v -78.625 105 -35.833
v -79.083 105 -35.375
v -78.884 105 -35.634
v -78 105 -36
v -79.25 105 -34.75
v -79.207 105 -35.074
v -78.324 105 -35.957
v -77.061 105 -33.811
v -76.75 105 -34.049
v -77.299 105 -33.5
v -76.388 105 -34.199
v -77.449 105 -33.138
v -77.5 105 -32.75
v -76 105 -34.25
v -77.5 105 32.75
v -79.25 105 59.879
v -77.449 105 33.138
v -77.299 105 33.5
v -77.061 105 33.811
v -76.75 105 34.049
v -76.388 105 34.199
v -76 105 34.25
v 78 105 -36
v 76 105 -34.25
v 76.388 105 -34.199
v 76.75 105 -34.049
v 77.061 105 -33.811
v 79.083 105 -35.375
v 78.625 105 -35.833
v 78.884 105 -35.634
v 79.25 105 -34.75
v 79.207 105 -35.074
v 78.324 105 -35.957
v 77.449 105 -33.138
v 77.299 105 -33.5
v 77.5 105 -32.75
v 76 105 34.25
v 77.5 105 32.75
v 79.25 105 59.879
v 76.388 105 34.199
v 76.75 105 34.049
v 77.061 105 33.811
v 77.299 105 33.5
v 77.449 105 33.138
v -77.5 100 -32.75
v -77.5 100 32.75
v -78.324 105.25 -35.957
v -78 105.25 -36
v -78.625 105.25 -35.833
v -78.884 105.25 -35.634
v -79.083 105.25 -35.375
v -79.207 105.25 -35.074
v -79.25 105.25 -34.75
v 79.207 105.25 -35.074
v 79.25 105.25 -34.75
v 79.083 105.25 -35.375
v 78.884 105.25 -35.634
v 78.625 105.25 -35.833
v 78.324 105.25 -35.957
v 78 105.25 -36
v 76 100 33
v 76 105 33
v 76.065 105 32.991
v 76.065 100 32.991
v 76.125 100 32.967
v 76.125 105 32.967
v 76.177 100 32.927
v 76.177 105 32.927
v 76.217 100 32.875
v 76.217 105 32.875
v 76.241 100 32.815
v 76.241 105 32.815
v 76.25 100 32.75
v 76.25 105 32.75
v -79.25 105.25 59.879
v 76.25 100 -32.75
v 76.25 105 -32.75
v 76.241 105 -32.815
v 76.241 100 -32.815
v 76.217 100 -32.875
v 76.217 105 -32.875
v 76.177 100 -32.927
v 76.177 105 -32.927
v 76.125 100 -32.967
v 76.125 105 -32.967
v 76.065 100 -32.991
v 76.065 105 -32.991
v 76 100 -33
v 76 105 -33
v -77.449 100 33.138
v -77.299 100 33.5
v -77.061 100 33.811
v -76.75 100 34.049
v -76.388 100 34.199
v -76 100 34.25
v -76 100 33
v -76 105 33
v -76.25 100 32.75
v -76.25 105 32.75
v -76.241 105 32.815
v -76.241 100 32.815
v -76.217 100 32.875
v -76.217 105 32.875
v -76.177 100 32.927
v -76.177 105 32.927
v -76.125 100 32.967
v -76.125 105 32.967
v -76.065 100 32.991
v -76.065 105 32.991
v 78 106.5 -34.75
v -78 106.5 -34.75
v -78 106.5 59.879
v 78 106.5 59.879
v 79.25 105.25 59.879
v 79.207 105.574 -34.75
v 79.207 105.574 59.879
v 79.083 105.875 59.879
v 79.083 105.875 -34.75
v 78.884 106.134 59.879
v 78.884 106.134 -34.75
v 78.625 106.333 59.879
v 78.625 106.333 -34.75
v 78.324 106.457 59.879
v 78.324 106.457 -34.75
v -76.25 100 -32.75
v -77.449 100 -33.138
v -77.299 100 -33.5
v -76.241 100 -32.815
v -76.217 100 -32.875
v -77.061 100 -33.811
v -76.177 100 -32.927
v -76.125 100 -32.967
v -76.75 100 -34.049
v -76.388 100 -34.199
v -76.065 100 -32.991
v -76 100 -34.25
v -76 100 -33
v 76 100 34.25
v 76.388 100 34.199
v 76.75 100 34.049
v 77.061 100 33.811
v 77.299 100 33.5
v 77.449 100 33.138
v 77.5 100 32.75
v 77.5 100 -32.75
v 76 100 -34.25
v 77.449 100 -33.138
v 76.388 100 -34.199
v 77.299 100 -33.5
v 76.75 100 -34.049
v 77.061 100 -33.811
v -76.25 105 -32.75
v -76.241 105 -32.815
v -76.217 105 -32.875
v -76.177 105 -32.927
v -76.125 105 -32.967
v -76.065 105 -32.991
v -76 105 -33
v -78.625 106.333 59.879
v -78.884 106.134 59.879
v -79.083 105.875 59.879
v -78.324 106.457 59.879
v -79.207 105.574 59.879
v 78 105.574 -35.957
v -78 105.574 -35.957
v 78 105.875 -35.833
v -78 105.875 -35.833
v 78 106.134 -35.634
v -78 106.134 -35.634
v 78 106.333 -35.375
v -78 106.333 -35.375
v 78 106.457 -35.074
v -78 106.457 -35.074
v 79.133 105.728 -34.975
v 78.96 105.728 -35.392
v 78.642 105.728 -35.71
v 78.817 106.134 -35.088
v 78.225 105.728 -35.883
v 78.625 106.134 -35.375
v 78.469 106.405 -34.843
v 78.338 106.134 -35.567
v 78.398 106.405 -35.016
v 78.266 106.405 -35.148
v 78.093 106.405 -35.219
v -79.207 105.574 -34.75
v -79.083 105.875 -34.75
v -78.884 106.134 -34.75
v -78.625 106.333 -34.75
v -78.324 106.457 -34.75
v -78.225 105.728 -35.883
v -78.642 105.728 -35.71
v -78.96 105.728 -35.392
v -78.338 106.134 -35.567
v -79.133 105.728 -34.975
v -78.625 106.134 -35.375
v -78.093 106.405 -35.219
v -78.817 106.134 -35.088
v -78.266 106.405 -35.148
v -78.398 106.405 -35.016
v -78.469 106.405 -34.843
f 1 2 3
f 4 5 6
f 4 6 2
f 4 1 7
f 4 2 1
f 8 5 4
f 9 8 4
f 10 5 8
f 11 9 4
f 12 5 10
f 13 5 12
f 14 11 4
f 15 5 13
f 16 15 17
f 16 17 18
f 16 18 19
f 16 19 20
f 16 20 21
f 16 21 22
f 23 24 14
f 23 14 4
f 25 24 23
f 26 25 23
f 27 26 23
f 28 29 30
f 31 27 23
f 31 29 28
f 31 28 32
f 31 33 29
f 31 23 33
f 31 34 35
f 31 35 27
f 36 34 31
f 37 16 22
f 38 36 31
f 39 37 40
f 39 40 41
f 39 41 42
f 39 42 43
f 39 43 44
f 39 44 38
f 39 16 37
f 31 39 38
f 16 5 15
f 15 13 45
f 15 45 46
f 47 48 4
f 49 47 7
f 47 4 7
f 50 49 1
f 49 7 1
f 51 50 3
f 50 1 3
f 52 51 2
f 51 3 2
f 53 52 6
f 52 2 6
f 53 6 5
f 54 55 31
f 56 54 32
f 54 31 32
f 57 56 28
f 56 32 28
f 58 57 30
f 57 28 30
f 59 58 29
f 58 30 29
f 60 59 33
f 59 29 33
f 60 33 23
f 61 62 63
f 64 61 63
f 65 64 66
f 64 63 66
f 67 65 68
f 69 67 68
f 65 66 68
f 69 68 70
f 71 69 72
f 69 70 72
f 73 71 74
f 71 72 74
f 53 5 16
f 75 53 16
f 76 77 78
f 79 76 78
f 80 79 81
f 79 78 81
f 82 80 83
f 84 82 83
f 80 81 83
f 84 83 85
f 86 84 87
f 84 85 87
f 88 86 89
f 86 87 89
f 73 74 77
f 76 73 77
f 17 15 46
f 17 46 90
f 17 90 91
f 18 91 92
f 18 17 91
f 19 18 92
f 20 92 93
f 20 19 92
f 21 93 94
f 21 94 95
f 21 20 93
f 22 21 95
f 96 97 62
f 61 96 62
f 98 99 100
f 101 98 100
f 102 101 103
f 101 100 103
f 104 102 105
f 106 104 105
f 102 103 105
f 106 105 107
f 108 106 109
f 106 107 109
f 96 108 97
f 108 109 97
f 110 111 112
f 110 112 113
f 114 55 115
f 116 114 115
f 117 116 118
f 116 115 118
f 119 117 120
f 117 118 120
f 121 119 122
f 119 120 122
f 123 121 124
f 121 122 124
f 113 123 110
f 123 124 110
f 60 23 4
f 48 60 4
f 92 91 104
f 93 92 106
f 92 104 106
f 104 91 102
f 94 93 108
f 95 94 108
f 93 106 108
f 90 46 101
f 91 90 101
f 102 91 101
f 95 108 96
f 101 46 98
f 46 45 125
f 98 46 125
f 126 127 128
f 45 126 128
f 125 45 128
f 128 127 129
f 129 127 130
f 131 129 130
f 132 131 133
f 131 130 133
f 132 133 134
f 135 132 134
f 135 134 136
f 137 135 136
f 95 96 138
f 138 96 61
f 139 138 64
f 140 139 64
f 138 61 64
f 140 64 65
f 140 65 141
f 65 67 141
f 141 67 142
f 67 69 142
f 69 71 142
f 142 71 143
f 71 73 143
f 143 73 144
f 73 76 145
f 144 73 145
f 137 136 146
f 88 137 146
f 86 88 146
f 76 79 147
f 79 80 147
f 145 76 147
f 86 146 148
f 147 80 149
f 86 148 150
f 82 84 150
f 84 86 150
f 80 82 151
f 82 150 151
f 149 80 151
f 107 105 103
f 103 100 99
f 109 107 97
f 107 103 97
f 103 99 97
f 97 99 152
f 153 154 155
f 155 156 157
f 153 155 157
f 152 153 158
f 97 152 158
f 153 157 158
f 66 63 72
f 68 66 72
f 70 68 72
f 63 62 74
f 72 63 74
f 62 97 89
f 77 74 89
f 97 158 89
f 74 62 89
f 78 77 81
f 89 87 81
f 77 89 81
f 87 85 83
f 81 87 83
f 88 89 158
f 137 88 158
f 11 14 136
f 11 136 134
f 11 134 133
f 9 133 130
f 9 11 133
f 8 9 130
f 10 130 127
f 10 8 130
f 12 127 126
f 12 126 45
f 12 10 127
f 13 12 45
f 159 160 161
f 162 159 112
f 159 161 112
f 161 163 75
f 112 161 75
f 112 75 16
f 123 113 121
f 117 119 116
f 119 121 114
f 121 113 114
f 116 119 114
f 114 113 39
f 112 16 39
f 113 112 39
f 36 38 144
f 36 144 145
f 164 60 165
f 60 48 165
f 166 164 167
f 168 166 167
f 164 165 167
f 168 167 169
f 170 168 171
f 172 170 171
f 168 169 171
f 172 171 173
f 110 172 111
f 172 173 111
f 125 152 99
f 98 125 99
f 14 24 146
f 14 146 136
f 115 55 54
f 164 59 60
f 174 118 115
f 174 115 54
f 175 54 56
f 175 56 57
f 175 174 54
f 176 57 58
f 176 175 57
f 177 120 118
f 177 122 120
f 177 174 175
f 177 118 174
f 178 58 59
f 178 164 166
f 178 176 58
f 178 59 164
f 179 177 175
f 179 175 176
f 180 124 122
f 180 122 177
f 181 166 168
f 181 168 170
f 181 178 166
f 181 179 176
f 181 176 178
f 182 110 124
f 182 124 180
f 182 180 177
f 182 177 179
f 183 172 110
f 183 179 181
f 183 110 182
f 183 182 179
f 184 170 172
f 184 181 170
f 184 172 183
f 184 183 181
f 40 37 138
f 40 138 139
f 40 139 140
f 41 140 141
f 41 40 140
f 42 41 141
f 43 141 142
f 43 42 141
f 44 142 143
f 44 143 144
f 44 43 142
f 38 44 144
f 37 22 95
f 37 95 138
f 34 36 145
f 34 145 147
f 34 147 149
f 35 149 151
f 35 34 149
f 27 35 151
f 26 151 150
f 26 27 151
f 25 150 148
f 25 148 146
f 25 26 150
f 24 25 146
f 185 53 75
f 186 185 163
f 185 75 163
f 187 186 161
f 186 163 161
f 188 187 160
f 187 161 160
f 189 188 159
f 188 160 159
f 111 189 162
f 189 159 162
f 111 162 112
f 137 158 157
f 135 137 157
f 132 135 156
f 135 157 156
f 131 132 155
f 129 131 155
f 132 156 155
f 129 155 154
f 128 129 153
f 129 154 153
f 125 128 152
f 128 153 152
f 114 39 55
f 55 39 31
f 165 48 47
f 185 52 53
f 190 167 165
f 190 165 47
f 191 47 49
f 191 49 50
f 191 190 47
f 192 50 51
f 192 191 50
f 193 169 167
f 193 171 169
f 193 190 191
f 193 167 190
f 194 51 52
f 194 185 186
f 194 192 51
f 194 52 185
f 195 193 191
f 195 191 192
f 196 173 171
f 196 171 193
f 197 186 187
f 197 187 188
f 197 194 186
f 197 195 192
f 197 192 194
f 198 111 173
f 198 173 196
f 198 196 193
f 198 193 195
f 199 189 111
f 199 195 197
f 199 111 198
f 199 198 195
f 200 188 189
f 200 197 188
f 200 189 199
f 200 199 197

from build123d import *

# Parameters (mm, degrees)
BOSS_EXTRUDE1_DEPTH      = 1.25
SKETCH1_W                = 156
SKETCH1_H                = 69.5
BOSS_EXTRUDE2_DEPTH      = 105
SKETCH4_R                = 2.5000000000000027
BOSS_EXTRUDE3_DEPTH      = 8
FILLET2_R                = 2
SKETCH5_R                = 1.5499999999999998
SKETCH5_R_2              = 1.5500000000000012
CUT_EXTRUDE1_DEPTH       = 8
SKETCH6_R                = 8.25
CUT_EXTRUDE2_DEPTH       = 8
SKETCH8_R                = 3.750000000000007
SKETCH8_R_2              = 3.0000000000000084
SKETCH8_W                = 7.000000000000014
SKETCH8_H                = 14
CUT_EXTRUDE3_DEPTH       = 8
FILLET3_R                = 1.25
FILLET4_R                = 1.25
SKETCH11_R               = 1.5499999999999932
CUT_EXTRUDE4_DEPTH       = 8
BOSS_EXTRUDE5_REACH      = 209.004
FILLET5_R                = 1.25
SKETCH14_R               = 1.5249999999999995
CUT_EXTRUDE5_DEPTH       = 8
BOSS_EXTRUDE6_DEPTH      = 5
CUT_EXTRUDE10_DEPTH      = 176.50000000000017
CUT_EXTRUDE10_DEPTH_BACK = 9
SKETCH19_R               = 1.5249999999999995
BOSS_EXTRUDE7_DEPTH      = 1.5
SKETCH17_W               = 214.39373035957487
SKETCH17_H               = 311.75060194691184
CUT_EXTRUDE6_DEPTH       = 142.50000000000003
SKETCH18_W               = 843.8612520819788
SKETCH18_H               = 210.19069540658822
CUT_EXTRUDE7_DEPTH       = 211.50000000000009
FILLET6_R                = 1.25
SKETCH21_R               = 1.5249999999999995
CUT_EXTRUDE11_DEPTH      = 46.50000000000004
SKETCH22_R               = 1.5249999999999952
SKETCH22_R_2             = 0.49999999999999917
SKETCH22_R_3             = 0.9999999999999983
CUT_EXTRUDE12_DEPTH      = 46.50000000000004
SKETCH23_W               = 224.34927592813784
SKETCH23_H               = 20
CUT_EXTRUDE13_DEPTH      = 108.00000000000004
SKETCH24_W               = 223.8278832276348
SKETCH24_H               = 83.20006380200533
CUT_EXTRUDE14_DEPTH      = 108.00000000000004


with BuildPart() as part:
    # Sketch2 → Boss-Extrude1 (new body)
    with BuildSketch(Plane(origin=(0, 0, 0), x_dir=(1, 0, 0), z_dir=(0, 1, 0))):
        Polygon((-79.25000000000004, 35.99999999999998), (79.24999999999996, 35.99999999999999), (79.24999999999999, -159.00000000000003), (-79.25000000000001, -159.00000000000003), align=None)
    extrude(amount=-BOSS_EXTRUDE1_DEPTH)

    # Sketch1 → Boss-Extrude2 (add)
    with BuildSketch(Plane(origin=(0, 0, 0), x_dir=(1, 0, 0), z_dir=(0, 1, 0))):
        Polygon((79.24999999999999, -159.00000000000003), (-79.25000000000001, -159.00000000000003), (-79.25000000000004, -86.00000000000001), (-79.25000000000004, -36.00000000000002), (-79.25000000000004, 35.99999999999998), (79.24999999999996, 35.99999999999999), (79.24999999999996, -36.00000000000002), (79.24999999999996, -86.00000000000001), align=None)
        Polygon((-78.00000000000001, -157.75000000000006), (77.99999999999999, -157.75000000000006), (77.99999999999996, -86.00000000000001), (77.99999999999996, -36.00000000000002), (-78.00000000000004, -36.00000000000002), (-78.00000000000004, -86.00000000000001), (-78.00000000000004, -100.58859756900745), align=None, mode=Mode.SUBTRACT)
        Rectangle(SKETCH1_W, SKETCH1_H, mode=Mode.SUBTRACT)
    extrude(amount=BOSS_EXTRUDE2_DEPTH)

    # Sketch4 → Boss-Extrude3 (add)
    with BuildSketch(Plane(origin=(0, 0, 0), x_dir=(1, 0, 0), z_dir=(0, 1, 0))):
        with Locations(Location((-37.074999999999996, -117.75000000000004, 0), (0, 0, 90))):
            Circle(SKETCH4_R)
        with Locations(Location((37.074999999999996, -117.75000000000003, 0), (0, 0, 90))):
            Circle(SKETCH4_R)
    extrude(amount=BOSS_EXTRUDE3_DEPTH)

    # Fillet2
    fillet2_edges = [part.edges().sort_by_distance(p)[0] for p in [
        (77.99999999999996, 52.5, -34.749999999999986),
        (77.99999999999996, 52.5, 34.750000000000014),
        (-78.00000000000004, 0, 1.421e-14),
        (-78.00000000000004, 52.5, 34.750000000000014),
        (77.99999999999999, 52.5, 157.75000000000006),
        (-78.00000000000001, 52.5, 157.75000000000006),
        (-4.263e-14, 0, 36.00000000000002),
        (-78.00000000000004, 52.5, 36.00000000000002),
        (77.99999999999997, 0, 96.87500000000003),
        (77.99999999999996, 52.5, 36.00000000000002),
        (-4.263e-14, 0, -34.749999999999986),
        (-78.00000000000004, 52.5, -34.749999999999986),
        (-1.421e-14, 0, 157.75000000000006),
        (-78.00000000000003, 0, 96.87500000000004),
        (77.99999999999996, 0, 1.421e-14),
        (-4.263e-14, 0, 34.750000000000014),
        (-37.074999999999996, 0, 120.25000000000004),
        (37.074999999999996, 0, 120.25000000000003),
    ]]
    fillet(fillet2_edges, radius=FILLET2_R)

    # Sketch5 → Cut-Extrude1 (cut)
    with BuildSketch(Plane.XY.offset(36.00000000000002)):
        with BuildLine():
            ThreePointArc((-53.750000000000085, 99.54999999999998), (-54.84601551083924, 99.09601551083914), (-55.30000000000008, 97.99999999999999))
            Line((-55.30000000000008, 97.99999999999999), (-53.750000000000085, 97.99999999999999))
            Line((-53.750000000000085, 97.99999999999999), (-53.750000000000085, 99.54999999999998))
        make_face()
        with BuildLine():
            Line((-53.750000000000085, 97.99999999999999), (-55.30000000000008, 97.99999999999999))
            ThreePointArc((-55.30000000000008, 97.99999999999999), (-53.750000000000085, 96.44999999999999), (-52.20000000000009, 97.99999999999999))
            ThreePointArc((-52.20000000000009, 97.99999999999999), (-52.65398448916093, 99.09601551083914), (-53.750000000000085, 99.54999999999998))
            Line((-53.750000000000085, 99.54999999999998), (-53.750000000000085, 97.99999999999999))
        make_face()
        with Locations((53.750000000000206, 97.99999999999967)):
            Circle(SKETCH5_R)
        with Locations((-53.750000000000085, 7.999999999999743)):
            Circle(SKETCH5_R_2)
        with Locations((53.749999999999666, 7.9999999999994245)):
            Circle(SKETCH5_R_2)
    extrude(amount=-CUT_EXTRUDE1_DEPTH, mode=Mode.SUBTRACT)

    # Sketch6 → Cut-Extrude2 (cut)
    with BuildSketch(Plane(origin=(0, 0, 157.75000000000006), x_dir=(-1, 0, 0), z_dir=(0, 0, -1))):
        with Locations((0, 22)):
            Circle(SKETCH6_R)
    extrude(amount=-CUT_EXTRUDE2_DEPTH, mode=Mode.SUBTRACT)

    # Sketch8 → Cut-Extrude3 (cut)
    with BuildSketch(Plane.ZY.offset(79.25000000000004)):
        with Locations((131.5, 54.99999999999998)):
            Circle(SKETCH8_R)
        with Locations((101.50000000000001, 54.99999999999998)):
            Circle(SKETCH8_R_2)
        with Locations((116.50000000000003, 64.99999999999999)):
            Rectangle(SKETCH8_W, SKETCH8_H)
        with Locations((101.50000000000001, 64.99999999999997)):
            Circle(SKETCH8_R_2)
        with Locations((101.50000000000001, 74.99999999999997)):
            Circle(SKETCH8_R_2)
        with Locations((101.50000000000001, 84.99999999999997)):
            Circle(SKETCH8_R_2)
        with Locations((131.5, 74.99999999999999)):
            Circle(SKETCH8_R)
    extrude(amount=-CUT_EXTRUDE3_DEPTH, mode=Mode.SUBTRACT)

    # Fillet3
    fillet3_edges = [part.edges().sort_by_distance(p)[0] for p in [
        (79.24999999999997, -1.25, 61.50000000000002),
        (-4.263e-14, -1.25, -35.999999999999986),
        (-79.25000000000003, -1.25, 61.50000000000003),
        (-1.421e-14, -1.25, 159.00000000000003),
    ]]
    fillet(fillet3_edges, radius=FILLET3_R)

    # Fillet4
    # the kernel refuses this fillet: 1.25 mm, written as the material it takes off along each edge
    with BuildSketch(Plane(origin=(-78.00000000000004, 0, -34.74999999999997), x_dir=(-9e-17, 0, -1), z_dir=(-1, 0, 1.5e-16))) as fillet4_piece_1_section:
        Polygon((0, 0), (FILLET4_R, 0), (FILLET4_R, FILLET4_R), (0, FILLET4_R), align=None)
    fillet4_piece_1 = extrude(amount=FILLET4_R, mode=Mode.PRIVATE)
    fillet4_piece_1 = fillet4_piece_1 - Plane(origin=(-78.00000000000004, 0, -34.74999999999997), x_dir=(0, 0.7071067811865475, 0.7071067811865475), z_dir=(-1, 0, 1.5e-16)) * Sphere(FILLET4_R, mode=Mode.PRIVATE)
    add(fillet4_piece_1, mode=Mode.SUBTRACT)
    with BuildSketch(Plane(origin=(77.99999999999996, 0, -34.74999999999999), x_dir=(-9e-17, 0, -1), z_dir=(1, 0, -1.5e-16))) as fillet4_piece_2_section:
        Polygon((0, 0), (FILLET4_R, 0), (FILLET4_R, -FILLET4_R), (0, -FILLET4_R), align=None)
    fillet4_piece_2 = extrude(amount=FILLET4_R, mode=Mode.PRIVATE)
    fillet4_piece_2 = fillet4_piece_2 - Plane(origin=(77.99999999999996, 0, -34.74999999999999), x_dir=(0, 0.7071067811865475, 0.7071067811865475), z_dir=(1, 0, -1.5e-16)) * Sphere(FILLET4_R, mode=Mode.PRIVATE)
    add(fillet4_piece_2, mode=Mode.SUBTRACT)
    with BuildSketch(Plane(origin=(-78.00000000000001, 0, 157.75000000000003), x_dir=(-1, 0, 1.5e-16), z_dir=(0, 0, 1))) as fillet4_piece_3_section:
        Polygon((0, 0), (FILLET4_R, 0), (FILLET4_R, FILLET4_R), (0, FILLET4_R), align=None)
    fillet4_piece_3 = extrude(amount=FILLET4_R, mode=Mode.PRIVATE)
    fillet4_piece_3 = fillet4_piece_3 - Plane(origin=(-78.00000000000001, 0, 157.75000000000003), x_dir=(0.7071067811865475, 0.7071067811865475, 0), z_dir=(0, 0, 1)) * Sphere(FILLET4_R, mode=Mode.PRIVATE)
    add(fillet4_piece_3, mode=Mode.SUBTRACT)
    with BuildSketch(Plane(origin=(77.99999999999999, 0, 157.75000000000003), x_dir=(1, 0, -1.5e-16), z_dir=(0, 0, 1))) as fillet4_piece_4_section:
        Polygon((0, 0), (FILLET4_R, 0), (FILLET4_R, -FILLET4_R), (0, -FILLET4_R), align=None)
    fillet4_piece_4 = extrude(amount=FILLET4_R, mode=Mode.PRIVATE)
    fillet4_piece_4 = fillet4_piece_4 - Plane(origin=(77.99999999999999, 0, 157.75000000000003), x_dir=(-0.7071067811865475, 0.7071067811865475, 0), z_dir=(0, 0, 1)) * Sphere(FILLET4_R, mode=Mode.PRIVATE)
    add(fillet4_piece_4, mode=Mode.SUBTRACT)
    with BuildSketch(Plane(origin=(79.24999999999999, 108.12500000000007, 159.00000000000003), x_dir=(-1, 0, 0), z_dir=(0, -1, 0))) as fillet4_piece_5:
        with BuildLine():
            CenterArc((FILLET4_R, FILLET4_R), FILLET4_R, 179.9999999999987, 90.00000000000131)
            Line((0, FILLET4_R), (0, 0))
            Line((0, 0), (FILLET4_R, 0))
        make_face()
    extrude(amount=108.12500000000007, mode=Mode.SUBTRACT)
    with BuildSketch(Plane(origin=(-79.25000000000001, -2.2e-16, 159.00000000000003), x_dir=(1, 0, 0), z_dir=(0, 1, 0))) as fillet4_piece_6:
        with BuildLine():
            CenterArc((FILLET4_R, FILLET4_R), FILLET4_R, 180, 90)
            Line((0, FILLET4_R), (0, 0))
            Line((0, 0), (FILLET4_R, 0))
        make_face()
    extrude(amount=108.12499999999999, mode=Mode.SUBTRACT)
    with BuildSketch(Plane(origin=(79.24999999999996, 108.125, -35.99999999999999), x_dir=(0, 0, 1), z_dir=(0, -1, 0))) as fillet4_piece_7:
        with BuildLine():
            CenterArc((FILLET4_R, FILLET4_R), FILLET4_R, 180, 90)
            Line((0, FILLET4_R), (0, 0))
            Line((0, 0), (FILLET4_R, 0))
        make_face()
    extrude(amount=108.125, mode=Mode.SUBTRACT)
    with BuildSketch(Plane(origin=(-79.25000000000004, -2.2e-16, -35.99999999999998), x_dir=(0, 0, 1), z_dir=(0, 1, 0))) as fillet4_piece_8:
        with BuildLine():
            CenterArc((FILLET4_R, FILLET4_R), FILLET4_R, 180, 90)
            Line((-2.132e-14, FILLET4_R), (0, 0))
            Line((0, 0), (FILLET4_R, 0))
        make_face()
    extrude(amount=108.12499999999999, mode=Mode.SUBTRACT)

    # Sketch11 → Cut-Extrude4 (cut)
    with BuildSketch(Plane(origin=(79.24999999999996, 0, -1.128e-14), x_dir=(-1.4e-16, 0, -1), z_dir=(1, 0, -1.4e-16))):
        with BuildLine():
            ThreePointArc((-13.05000000000001, 102.49999999999999), (-12.596015510839159, 101.40398448916083), (-11.50000000000001, 100.94999999999999))
            Line((-11.50000000000001, 100.94999999999999), (-11.50000000000001, 102.49999999999999))
            Line((-11.500000000000014, 102.49999999999999), (-13.050000000000011, 102.49999999999999))
        make_face()
        with BuildLine():
            Line((-11.50000000000001, 102.49999999999999), (-11.50000000000001, 100.94999999999999))
            ThreePointArc((-11.50000000000001, 100.94999999999999), (-10.403984489160864, 101.40398448916083), (-9.950000000000012, 102.49999999999999))
            ThreePointArc((-9.950000000000012, 102.49999999999999), (-11.50000000000001, 104.04999999999998), (-13.05000000000001, 102.49999999999999))
            Line((-13.050000000000011, 102.49999999999999), (-11.500000000000014, 102.49999999999999))
        make_face()
        with BuildLine():
            ThreePointArc((-25.550000000000008, 90), (-25.096015510839155, 88.90398448916085), (-24.000000000000007, 88.45))
            Line((-24.000000000000007, 88.45000000000002), (-24.000000000000007, 90))
            Line((-24, 90), (-25.55000000000001, 90))
        make_face()
        with BuildLine():
            Line((-24.000000000000007, 90), (-24.000000000000007, 88.45000000000002))
            ThreePointArc((-24.000000000000007, 88.45), (-22.90398448916086, 88.90398448916085), (-22.450000000000006, 90))
            ThreePointArc((-22.450000000000006, 90), (-24.000000000000007, 91.55), (-25.550000000000008, 90))
            Line((-25.55000000000001, 90), (-24, 90))
        make_face()
        with BuildLine():
            ThreePointArc((-9.949999999999998, 2.4999999999999742), (-10.403984489160848, 3.5960155108391216), (-11.499999999999995, 4.049999999999974))
            Line((-11.499999999999996, 4.049999999999969), (-11.499999999999996, 2.4999999999999716))
            Line((-11.5, 2.4999999999999742), (-13.049999999999997, 2.4999999999999742))
            ThreePointArc((-13.049999999999995, 2.4999999999999742), (-11.499999999999996, 0.9499999999999749), (-9.949999999999998, 2.499999999999974))
        make_face()
        with BuildLine():
            Line((-11.499999999999996, 2.4999999999999716), (-11.499999999999996, 4.049999999999969))
            ThreePointArc((-11.499999999999995, 4.049999999999974), (-12.596015510839145, 3.596015510839123), (-13.049999999999995, 2.4999999999999742))
            Line((-13.049999999999997, 2.4999999999999742), (-11.5, 2.4999999999999742))
        make_face()
        with BuildLine():
            ThreePointArc((-111.5, 4.049999999999969), (-112.59601551083915, 1.40398448916083), (-109.95, 2.499999999999974))
            Line((-109.95, 2.4999999999999742), (-111.5, 2.4999999999999742))
            Line((-111.5, 2.4999999999999716), (-111.5, 4.049999999999969))
        make_face()
        with BuildLine():
            Line((-111.5, 2.4999999999999742), (-109.95, 2.4999999999999742))
            ThreePointArc((-109.95, 2.4999999999999742), (-110.40398448916086, 3.5960155108391185), (-111.5, 4.049999999999969))
            Line((-111.5, 4.049999999999969), (-111.5, 2.4999999999999716))
        make_face()
        with BuildLine():
            ThreePointArc((-97.45, 14.999999999999993), (-97.90398448916086, 16.096015510839138), (-99, 16.549999999999986))
            Line((-99, 16.549999999999986), (-99, 14.999999999999993))
            Line((-99, 14.999999999999993), (-97.45, 14.999999999999993))
        make_face()
        with BuildLine():
            Line((-99, 14.999999999999993), (-99, 16.549999999999986))
            ThreePointArc((-99, 16.549999999999986), (-100.09601551083915, 13.903984489160848), (-97.45, 14.999999999999993))
            Line((-97.45, 14.999999999999993), (-99, 14.999999999999993))
        make_face()
        with BuildLine():
            ThreePointArc((-22.450000000000006, 14.999999999999993), (-22.90398448916086, 16.09601551083914), (-24.000000000000007, 16.549999999999994))
            Line((-24.000000000000007, 16.549999999999994), (-24.000000000000007, 14.999999999999993))
            Line((-24, 14.999999999999993), (-25.55000000000001, 14.999999999999993))
            ThreePointArc((-25.550000000000008, 14.999999999999993), (-24.000000000000007, 13.449999999999992), (-22.450000000000006, 14.999999999999993))
        make_face()
        with BuildLine():
            Line((-24.000000000000007, 14.999999999999993), (-24.000000000000007, 16.549999999999994))
            ThreePointArc((-24.000000000000007, 16.549999999999994), (-25.096015510839155, 16.09601551083914), (-25.550000000000008, 14.999999999999993))
            Line((-25.55000000000001, 14.999999999999993), (-24, 14.999999999999993))
        make_face()
        with Locations((-111.50000000000001, 102.49999999999999)):
            Circle(SKETCH11_R)
        with Locations((-99, 90)):
            Circle(SKETCH11_R)
    extrude(amount=-CUT_EXTRUDE4_DEPTH, mode=Mode.SUBTRACT)

    # Boss-Extrude5: up to this face of the body (flat: up to its plane)
    boss_extrude5_end = Plane(part.part.faces().sort_by_distance((0, 0, 96.725539908))[0])
    # Sketch12 → Boss-Extrude5 (add, up to the picked face)
    with BuildSketch(Plane(origin=(0, 105, 0), x_dir=(1, 0, 0), z_dir=(0, 1, 0)), mode=Mode.PRIVATE) as boss_extrude5_sk1:
        with BuildLine():
            Line((73, -152.75000000000043), (72.99999999999997, -157.75000000000043))
            Line((72.99999999999997, -157.75000000000043), (75.99999999999996, -157.75000000000045))
            ThreePointArc((75.99999999999996, -157.75000000000006), (77.41421356237305, -157.16421356237316), (77.99999999999994, -155.75000000000006))
            Line((77.99999999999999, -155.75000000000006), (78, -152.75000000000045))
            Line((78, -152.75000000000045), (73, -152.75000000000043))
        make_face()
    boss_extrude5_tool1 = split(extrude(boss_extrude5_sk1.sketch, amount=-BOSS_EXTRUDE5_REACH, mode=Mode.PRIVATE), bisect_by=boss_extrude5_end, keep=Keep.BOTH, mode=Mode.PRIVATE)
    # Sketch12 → Boss-Extrude5 (add, up to the picked face)
    with BuildSketch(Plane(origin=(0, 105, 0), x_dir=(1, 0, 0), z_dir=(0, 1, 0)), mode=Mode.PRIVATE) as boss_extrude5_sk2:
        with BuildLine():
            ThreePointArc((-78.00000000000003, -155.75000000000006), (-77.41421356237313, -157.16421356237316), (-76.00000000000003, -157.75000000000006))
            Line((-76.00000000000003, -157.75000000000006), (-73.00000000000003, -157.75000000000006))
            Line((-73.00000000000003, -157.75000000000006), (-73.00000000000003, -152.75000000000006))
            Line((-73.00000000000003, -152.75000000000006), (-78.00000000000003, -152.75000000000006))
            Line((-78.00000000000003, -152.75000000000006), (-78.00000000000003, -155.75000000000006))
        make_face()
    boss_extrude5_tool2 = split(extrude(boss_extrude5_sk2.sketch, amount=-BOSS_EXTRUDE5_REACH, mode=Mode.PRIVATE), bisect_by=boss_extrude5_end, keep=Keep.BOTH, mode=Mode.PRIVATE)
    add(boss_extrude5_tool1.solids().sort_by(Axis((75.426992, 105, 155.176992), (0, -1, 0)))[0])
    add(boss_extrude5_tool2.solids().sort_by(Axis((-75.426992, 105, 155.176992), (0, -1, 0)))[0])

    # Fillet5
    fillet5_edges = [part.edges().sort_by_distance(p)[0] for p in [
        (77.41421356237306, 0.5857864376269042, 152.75000000000043),
        (72.99999999999999, 0.5857864376269046, 157.16421356237316),
        (72.99999999999997, 53.5, 157.75000000000043),
        (74.49999999999999, 0, 152.75000000000043),
        (73, 52.5, 152.75000000000043),
        (78, 53.5, 152.75000000000045),
        (73, 0, 154.25000000000023),
        (-77.41421356237313, 0.5857864376269042, 152.75000000000006),
        (-73.00000000000003, 0, 154.25000000000006),
        (-73.00000000000003, 52.5, 152.75000000000006),
        (-78.00000000000003, 53.5, 152.75000000000006),
        (-74.50000000000003, 0, 152.75000000000006),
        (-73.00000000000003, 0.5857864376269046, 157.16421356237316),
        (-73.00000000000003, 53.5, 157.75000000000006),
    ]]
    fillet(fillet5_edges, radius=FILLET5_R)

    # Sketch14 → Cut-Extrude5 (cut)
    with BuildSketch(Plane(origin=(0, 105, 0), x_dir=(1, 0, 0), z_dir=(0, 1, 0))):
        with Locations(Location((75.68305826175839, -155.43305826175865, 0), (0, 0, 270))):
            Circle(SKETCH14_R)
        with Locations(Location((-75.68305826175845, -155.43305826175828, 0), (0, 0, 270))):
            Circle(SKETCH14_R)
    extrude(amount=-CUT_EXTRUDE5_DEPTH, mode=Mode.SUBTRACT)

    # Sketch19 → Cut-Extrude10 (cut, two sides: drawn at the far end of the back side and taken through both)
    with BuildSketch(Plane(origin=(0, 105, 0), x_dir=(1, 0, 0), z_dir=(0, 1, 0)).offset(-CUT_EXTRUDE10_DEPTH_BACK)):
        with Locations(Location((75.68305826175839, -155.43305826175865, 0), (0, 0, 270))):
            Circle(SKETCH19_R)
        with Locations(Location((-75.68305826175845, -155.43305826175828, 0), (0, 0, 270))):
            Circle(SKETCH19_R)
    extrude(amount=CUT_EXTRUDE10_DEPTH + CUT_EXTRUDE10_DEPTH_BACK, mode=Mode.SUBTRACT)



with BuildPart() as body_2:
    # Sketch15 → Boss-Extrude6 (new body)
    with BuildSketch(Plane(origin=(0, 105, 0), x_dir=(1, 0, 0), z_dir=(0, 1, 0))):
        with BuildLine():
            Line((-77.50000000000004, 32.749999999999986), (-77.50000000000004, -32.750000000000014))
            ThreePointArc((-77.50000000000004, -32.750000000000014), (-77.06066017177986, -33.81066017177984), (-76.00000000000004, -34.250000000000014))
            Line((-76.00000000000004, -34.250000000000014), (75.99999999999996, -34.250000000000014))
            ThreePointArc((75.99999999999996, -34.250000000000014), (77.06066017177977, -33.81066017177984), (77.49999999999996, -32.750000000000014))
            Line((77.49999999999996, -32.750000000000014), (77.49999999999996, 32.749999999999986))
            ThreePointArc((77.49999999999996, 32.749999999999986), (77.06066017177977, 33.81066017177981), (75.99999999999996, 34.249999999999986))
            Line((75.99999999999996, 34.249999999999986), (-76.00000000000004, 34.249999999999986))
            ThreePointArc((-76.00000000000004, 34.249999999999986), (-77.06066017177986, 33.81066017177981), (-77.50000000000004, 32.749999999999986))
        make_face()
        with BuildLine():
            Line((75.99999999999996, 32.999999999999986), (-76.00000000000004, 32.999999999999986))
            ThreePointArc((-76.00000000000004, 32.999999999999986), (-76.17677669529668, 32.926776695296624), (-76.25000000000004, 32.749999999999986))
            Line((-76.25000000000004, 32.749999999999986), (-76.25000000000004, -32.750000000000014))
            ThreePointArc((-76.25000000000004, -32.750000000000014), (-76.17677669529668, -32.92677669529665), (-76.00000000000004, -33.000000000000014))
            Line((-76.00000000000004, -33.000000000000014), (75.99999999999996, -33.000000000000014))
            ThreePointArc((75.99999999999996, -33.000000000000014), (76.1767766952966, -32.92677669529665), (76.24999999999996, -32.750000000000014))
            Line((76.24999999999996, -32.750000000000014), (76.24999999999996, 32.749999999999986))
            ThreePointArc((76.24999999999996, 32.749999999999986), (76.1767766952966, 32.926776695296624), (75.99999999999996, 32.999999999999986))
        make_face(mode=Mode.SUBTRACT)
    extrude(amount=-BOSS_EXTRUDE6_DEPTH)


with BuildPart() as part_1:
    add(part.part)

    add(body_2.part)  # Boss-Extrude7 merges body 2
    # Sketch16 → Boss-Extrude7 (add)
    with BuildSketch(Plane(origin=(0, 105, 0), x_dir=(1, 0, 0), z_dir=(0, 1, 0))):
        with BuildLine():
            Line((-79.25000000000004, 34.74999999999998), (-79.25000000000004, -157.75000000000003))
            ThreePointArc((-79.25000000000004, -157.75000000000003), (-78.88388347648322, -158.63388347648322), (-78.00000000000001, -159.00000000000003))
            Line((-78.00000000000001, -159.00000000000003), (77.99999999999999, -159.00000000000003))
            ThreePointArc((77.99999999999999, -159.00000000000003), (78.88388347648316, -158.63388347648322), (79.24999999999999, -157.75000000000003))
            Line((79.24999999999999, -157.75000000000003), (79.24999999999991, 34.749999999999986))
            ThreePointArc((79.24999999999991, 34.749999999999986), (78.8838834764831, 35.63388347648314), (77.99999999999996, 35.99999999999997))
            Line((77.99999999999996, 35.99999999999997), (-78.00000000000004, 35.99999999999998))
            ThreePointArc((-78.00000000000004, 35.99999999999998), (-78.88388347648322, 35.63388347648316), (-79.25000000000004, 34.74999999999998))
        make_face()
    extrude(amount=BOSS_EXTRUDE7_DEPTH)

    # Sketch17 → Cut-Extrude6 (cut)
    with BuildSketch(Plane.XZ.offset(-105)):
        with Locations((-9.695908791144348, 54.3605461890202)):
            Rectangle(SKETCH17_W, SKETCH17_H)
        with BuildLine():
            Line((77.99999999999996, -32.749999999999986), (77.99999999999996, 32.750000000000014))
            ThreePointArc((77.99999999999996, 32.750000000000014), (77.41421356237305, 34.16421356237311), (75.99999999999996, 34.750000000000014))
            Line((75.99999999999996, 34.750000000000014), (-76.00000000000004, 34.750000000000014))
            ThreePointArc((-76.00000000000004, 34.750000000000014), (-77.41421356237313, 34.16421356237311), (-78.00000000000004, 32.750000000000014))
            Line((-78.00000000000004, 32.750000000000014), (-78.00000000000004, -32.749999999999986))
            ThreePointArc((-78.00000000000004, -32.749999999999986), (-77.41421356237313, -34.16421356237308), (-76.00000000000004, -34.749999999999986))
            Line((-76.00000000000004, -34.749999999999986), (75.99999999999996, -34.749999999999986))
            ThreePointArc((75.99999999999996, -34.749999999999986), (77.41421356237305, -34.16421356237308), (77.99999999999996, -32.749999999999986))
        make_face(mode=Mode.SUBTRACT)
    extrude(amount=CUT_EXTRUDE6_DEPTH, mode=Mode.SUBTRACT)


with BuildPart() as cut_extrude6_piece_1:
    # of the separate pieces the step leaves, piece 1, a body of its own (cut_extrude6_pieces)
    add(part_1.part.solids().sort_by_distance((-76, 105, -34.25))[0])

    # Fillet6
    fillet6_edges = [cut_extrude6_piece_1.edges().sort_by_distance(p)[0] for p in [
        (-78.88388347648322, 106.5, -35.633883476483156),
        (-79.25000000000004, 106.5, 61.50000000000002),
        (-78.88388347648322, 106.5, 158.63388347648322),
        (-1.421e-14, 106.5, 159.00000000000003),
        (78.88388347648318, 106.5, 158.63388347648322),
        (79.24999999999994, 106.5, 61.50000000000003),
        (78.8838834764831, 106.5, -35.63388347648314),
        (-4.263e-14, 106.5, -35.99999999999997),
    ]]
    fillet(fillet6_edges, radius=FILLET6_R)

    # Sketch21 → Cut-Extrude11 (cut)
    with BuildSketch(Plane(origin=(0, 106.5, 0), x_dir=(1, 0, 0), z_dir=(0, 1, 0))):
        with Locations(Location((-75.68068975770814, -155.43068975770817, 0), (0, 0, 270))):
            Circle(SKETCH21_R)
        with Locations(Location((75.68068975770811, -155.43068975770834, 0), (0, 0, 270))):
            Circle(SKETCH21_R)
    extrude(amount=-CUT_EXTRUDE11_DEPTH, mode=Mode.SUBTRACT)

    # Sketch22 → Cut-Extrude12 (cut)
    with BuildSketch(Plane(origin=(0, 106.5, 0), x_dir=(1, 0, 0), z_dir=(0, 1, 0))):
        with Locations(Location((-53.000000000000014, -122.75000000000003, 0), (0, 0, 270))):
            Circle(SKETCH22_R)
        with Locations(Location((53.000000000000014, -121.25000000000003, 0), (0, 0, 270))):
            Circle(SKETCH22_R_2)
        with Locations(Location((53.000000000000014, -124.25000000000003, 0), (0, 0, 270))):
            Circle(SKETCH22_R_2)
        with Locations(Location((48.000000000000014, -122.75000000000003, 0), (0, 0, 270))):
            Circle(SKETCH22_R_3)
    extrude(amount=-CUT_EXTRUDE12_DEPTH, mode=Mode.SUBTRACT)

    # Sketch23 → Cut-Extrude13 (cut)
    with BuildSketch(Plane.XZ.offset(-105)):
        with Locations((5.748765940339929, 69.87855319631414)):
            Rectangle(SKETCH23_W, SKETCH23_H)
    extrude(amount=-CUT_EXTRUDE13_DEPTH, mode=Mode.SUBTRACT)


with BuildPart() as cut_extrude6_piece_2:
    # of the separate pieces the step leaves, piece 2, a body of its own (cut_extrude6_pieces)
    add(part_1.part.solids().sort_by_distance((-78, 2, -32.75))[0])

    # Sketch18 → Cut-Extrude7 (cut)
    with BuildSketch(Plane.XZ.offset(-99.99999999999999)):
        Rectangle(SKETCH18_W, SKETCH18_H)
    extrude(amount=CUT_EXTRUDE7_DEPTH, mode=Mode.SUBTRACT)


with BuildPart() as cut_extrude13_piece_1:
    # of the separate pieces the step leaves, piece 1, a body of its own (cut_extrude13_pieces)
    add(cut_extrude6_piece_1.part.solids().sort_by_distance((-79.25, 105, 59.878553196))[0])


with BuildPart() as cut_extrude13_piece_2:
    # of the separate pieces the step leaves, piece 2, a body of its own (cut_extrude13_pieces)
    add(cut_extrude6_piece_1.part.solids().sort_by_distance((-78, 105.25, 159))[0])

    # Sketch24 → Cut-Extrude14 (cut)
    with BuildSketch(Plane(origin=(0, 0, 79.87855319631414), x_dir=(-1, 0, 0), z_dir=(0, 0, -1))):
        with Locations((-6.53504656057757, 105)):
            Rectangle(SKETCH24_W, SKETCH24_H)
    extrude(amount=-CUT_EXTRUDE14_DEPTH, mode=Mode.SUBTRACT)


solid = cut_extrude13_piece_1.part
